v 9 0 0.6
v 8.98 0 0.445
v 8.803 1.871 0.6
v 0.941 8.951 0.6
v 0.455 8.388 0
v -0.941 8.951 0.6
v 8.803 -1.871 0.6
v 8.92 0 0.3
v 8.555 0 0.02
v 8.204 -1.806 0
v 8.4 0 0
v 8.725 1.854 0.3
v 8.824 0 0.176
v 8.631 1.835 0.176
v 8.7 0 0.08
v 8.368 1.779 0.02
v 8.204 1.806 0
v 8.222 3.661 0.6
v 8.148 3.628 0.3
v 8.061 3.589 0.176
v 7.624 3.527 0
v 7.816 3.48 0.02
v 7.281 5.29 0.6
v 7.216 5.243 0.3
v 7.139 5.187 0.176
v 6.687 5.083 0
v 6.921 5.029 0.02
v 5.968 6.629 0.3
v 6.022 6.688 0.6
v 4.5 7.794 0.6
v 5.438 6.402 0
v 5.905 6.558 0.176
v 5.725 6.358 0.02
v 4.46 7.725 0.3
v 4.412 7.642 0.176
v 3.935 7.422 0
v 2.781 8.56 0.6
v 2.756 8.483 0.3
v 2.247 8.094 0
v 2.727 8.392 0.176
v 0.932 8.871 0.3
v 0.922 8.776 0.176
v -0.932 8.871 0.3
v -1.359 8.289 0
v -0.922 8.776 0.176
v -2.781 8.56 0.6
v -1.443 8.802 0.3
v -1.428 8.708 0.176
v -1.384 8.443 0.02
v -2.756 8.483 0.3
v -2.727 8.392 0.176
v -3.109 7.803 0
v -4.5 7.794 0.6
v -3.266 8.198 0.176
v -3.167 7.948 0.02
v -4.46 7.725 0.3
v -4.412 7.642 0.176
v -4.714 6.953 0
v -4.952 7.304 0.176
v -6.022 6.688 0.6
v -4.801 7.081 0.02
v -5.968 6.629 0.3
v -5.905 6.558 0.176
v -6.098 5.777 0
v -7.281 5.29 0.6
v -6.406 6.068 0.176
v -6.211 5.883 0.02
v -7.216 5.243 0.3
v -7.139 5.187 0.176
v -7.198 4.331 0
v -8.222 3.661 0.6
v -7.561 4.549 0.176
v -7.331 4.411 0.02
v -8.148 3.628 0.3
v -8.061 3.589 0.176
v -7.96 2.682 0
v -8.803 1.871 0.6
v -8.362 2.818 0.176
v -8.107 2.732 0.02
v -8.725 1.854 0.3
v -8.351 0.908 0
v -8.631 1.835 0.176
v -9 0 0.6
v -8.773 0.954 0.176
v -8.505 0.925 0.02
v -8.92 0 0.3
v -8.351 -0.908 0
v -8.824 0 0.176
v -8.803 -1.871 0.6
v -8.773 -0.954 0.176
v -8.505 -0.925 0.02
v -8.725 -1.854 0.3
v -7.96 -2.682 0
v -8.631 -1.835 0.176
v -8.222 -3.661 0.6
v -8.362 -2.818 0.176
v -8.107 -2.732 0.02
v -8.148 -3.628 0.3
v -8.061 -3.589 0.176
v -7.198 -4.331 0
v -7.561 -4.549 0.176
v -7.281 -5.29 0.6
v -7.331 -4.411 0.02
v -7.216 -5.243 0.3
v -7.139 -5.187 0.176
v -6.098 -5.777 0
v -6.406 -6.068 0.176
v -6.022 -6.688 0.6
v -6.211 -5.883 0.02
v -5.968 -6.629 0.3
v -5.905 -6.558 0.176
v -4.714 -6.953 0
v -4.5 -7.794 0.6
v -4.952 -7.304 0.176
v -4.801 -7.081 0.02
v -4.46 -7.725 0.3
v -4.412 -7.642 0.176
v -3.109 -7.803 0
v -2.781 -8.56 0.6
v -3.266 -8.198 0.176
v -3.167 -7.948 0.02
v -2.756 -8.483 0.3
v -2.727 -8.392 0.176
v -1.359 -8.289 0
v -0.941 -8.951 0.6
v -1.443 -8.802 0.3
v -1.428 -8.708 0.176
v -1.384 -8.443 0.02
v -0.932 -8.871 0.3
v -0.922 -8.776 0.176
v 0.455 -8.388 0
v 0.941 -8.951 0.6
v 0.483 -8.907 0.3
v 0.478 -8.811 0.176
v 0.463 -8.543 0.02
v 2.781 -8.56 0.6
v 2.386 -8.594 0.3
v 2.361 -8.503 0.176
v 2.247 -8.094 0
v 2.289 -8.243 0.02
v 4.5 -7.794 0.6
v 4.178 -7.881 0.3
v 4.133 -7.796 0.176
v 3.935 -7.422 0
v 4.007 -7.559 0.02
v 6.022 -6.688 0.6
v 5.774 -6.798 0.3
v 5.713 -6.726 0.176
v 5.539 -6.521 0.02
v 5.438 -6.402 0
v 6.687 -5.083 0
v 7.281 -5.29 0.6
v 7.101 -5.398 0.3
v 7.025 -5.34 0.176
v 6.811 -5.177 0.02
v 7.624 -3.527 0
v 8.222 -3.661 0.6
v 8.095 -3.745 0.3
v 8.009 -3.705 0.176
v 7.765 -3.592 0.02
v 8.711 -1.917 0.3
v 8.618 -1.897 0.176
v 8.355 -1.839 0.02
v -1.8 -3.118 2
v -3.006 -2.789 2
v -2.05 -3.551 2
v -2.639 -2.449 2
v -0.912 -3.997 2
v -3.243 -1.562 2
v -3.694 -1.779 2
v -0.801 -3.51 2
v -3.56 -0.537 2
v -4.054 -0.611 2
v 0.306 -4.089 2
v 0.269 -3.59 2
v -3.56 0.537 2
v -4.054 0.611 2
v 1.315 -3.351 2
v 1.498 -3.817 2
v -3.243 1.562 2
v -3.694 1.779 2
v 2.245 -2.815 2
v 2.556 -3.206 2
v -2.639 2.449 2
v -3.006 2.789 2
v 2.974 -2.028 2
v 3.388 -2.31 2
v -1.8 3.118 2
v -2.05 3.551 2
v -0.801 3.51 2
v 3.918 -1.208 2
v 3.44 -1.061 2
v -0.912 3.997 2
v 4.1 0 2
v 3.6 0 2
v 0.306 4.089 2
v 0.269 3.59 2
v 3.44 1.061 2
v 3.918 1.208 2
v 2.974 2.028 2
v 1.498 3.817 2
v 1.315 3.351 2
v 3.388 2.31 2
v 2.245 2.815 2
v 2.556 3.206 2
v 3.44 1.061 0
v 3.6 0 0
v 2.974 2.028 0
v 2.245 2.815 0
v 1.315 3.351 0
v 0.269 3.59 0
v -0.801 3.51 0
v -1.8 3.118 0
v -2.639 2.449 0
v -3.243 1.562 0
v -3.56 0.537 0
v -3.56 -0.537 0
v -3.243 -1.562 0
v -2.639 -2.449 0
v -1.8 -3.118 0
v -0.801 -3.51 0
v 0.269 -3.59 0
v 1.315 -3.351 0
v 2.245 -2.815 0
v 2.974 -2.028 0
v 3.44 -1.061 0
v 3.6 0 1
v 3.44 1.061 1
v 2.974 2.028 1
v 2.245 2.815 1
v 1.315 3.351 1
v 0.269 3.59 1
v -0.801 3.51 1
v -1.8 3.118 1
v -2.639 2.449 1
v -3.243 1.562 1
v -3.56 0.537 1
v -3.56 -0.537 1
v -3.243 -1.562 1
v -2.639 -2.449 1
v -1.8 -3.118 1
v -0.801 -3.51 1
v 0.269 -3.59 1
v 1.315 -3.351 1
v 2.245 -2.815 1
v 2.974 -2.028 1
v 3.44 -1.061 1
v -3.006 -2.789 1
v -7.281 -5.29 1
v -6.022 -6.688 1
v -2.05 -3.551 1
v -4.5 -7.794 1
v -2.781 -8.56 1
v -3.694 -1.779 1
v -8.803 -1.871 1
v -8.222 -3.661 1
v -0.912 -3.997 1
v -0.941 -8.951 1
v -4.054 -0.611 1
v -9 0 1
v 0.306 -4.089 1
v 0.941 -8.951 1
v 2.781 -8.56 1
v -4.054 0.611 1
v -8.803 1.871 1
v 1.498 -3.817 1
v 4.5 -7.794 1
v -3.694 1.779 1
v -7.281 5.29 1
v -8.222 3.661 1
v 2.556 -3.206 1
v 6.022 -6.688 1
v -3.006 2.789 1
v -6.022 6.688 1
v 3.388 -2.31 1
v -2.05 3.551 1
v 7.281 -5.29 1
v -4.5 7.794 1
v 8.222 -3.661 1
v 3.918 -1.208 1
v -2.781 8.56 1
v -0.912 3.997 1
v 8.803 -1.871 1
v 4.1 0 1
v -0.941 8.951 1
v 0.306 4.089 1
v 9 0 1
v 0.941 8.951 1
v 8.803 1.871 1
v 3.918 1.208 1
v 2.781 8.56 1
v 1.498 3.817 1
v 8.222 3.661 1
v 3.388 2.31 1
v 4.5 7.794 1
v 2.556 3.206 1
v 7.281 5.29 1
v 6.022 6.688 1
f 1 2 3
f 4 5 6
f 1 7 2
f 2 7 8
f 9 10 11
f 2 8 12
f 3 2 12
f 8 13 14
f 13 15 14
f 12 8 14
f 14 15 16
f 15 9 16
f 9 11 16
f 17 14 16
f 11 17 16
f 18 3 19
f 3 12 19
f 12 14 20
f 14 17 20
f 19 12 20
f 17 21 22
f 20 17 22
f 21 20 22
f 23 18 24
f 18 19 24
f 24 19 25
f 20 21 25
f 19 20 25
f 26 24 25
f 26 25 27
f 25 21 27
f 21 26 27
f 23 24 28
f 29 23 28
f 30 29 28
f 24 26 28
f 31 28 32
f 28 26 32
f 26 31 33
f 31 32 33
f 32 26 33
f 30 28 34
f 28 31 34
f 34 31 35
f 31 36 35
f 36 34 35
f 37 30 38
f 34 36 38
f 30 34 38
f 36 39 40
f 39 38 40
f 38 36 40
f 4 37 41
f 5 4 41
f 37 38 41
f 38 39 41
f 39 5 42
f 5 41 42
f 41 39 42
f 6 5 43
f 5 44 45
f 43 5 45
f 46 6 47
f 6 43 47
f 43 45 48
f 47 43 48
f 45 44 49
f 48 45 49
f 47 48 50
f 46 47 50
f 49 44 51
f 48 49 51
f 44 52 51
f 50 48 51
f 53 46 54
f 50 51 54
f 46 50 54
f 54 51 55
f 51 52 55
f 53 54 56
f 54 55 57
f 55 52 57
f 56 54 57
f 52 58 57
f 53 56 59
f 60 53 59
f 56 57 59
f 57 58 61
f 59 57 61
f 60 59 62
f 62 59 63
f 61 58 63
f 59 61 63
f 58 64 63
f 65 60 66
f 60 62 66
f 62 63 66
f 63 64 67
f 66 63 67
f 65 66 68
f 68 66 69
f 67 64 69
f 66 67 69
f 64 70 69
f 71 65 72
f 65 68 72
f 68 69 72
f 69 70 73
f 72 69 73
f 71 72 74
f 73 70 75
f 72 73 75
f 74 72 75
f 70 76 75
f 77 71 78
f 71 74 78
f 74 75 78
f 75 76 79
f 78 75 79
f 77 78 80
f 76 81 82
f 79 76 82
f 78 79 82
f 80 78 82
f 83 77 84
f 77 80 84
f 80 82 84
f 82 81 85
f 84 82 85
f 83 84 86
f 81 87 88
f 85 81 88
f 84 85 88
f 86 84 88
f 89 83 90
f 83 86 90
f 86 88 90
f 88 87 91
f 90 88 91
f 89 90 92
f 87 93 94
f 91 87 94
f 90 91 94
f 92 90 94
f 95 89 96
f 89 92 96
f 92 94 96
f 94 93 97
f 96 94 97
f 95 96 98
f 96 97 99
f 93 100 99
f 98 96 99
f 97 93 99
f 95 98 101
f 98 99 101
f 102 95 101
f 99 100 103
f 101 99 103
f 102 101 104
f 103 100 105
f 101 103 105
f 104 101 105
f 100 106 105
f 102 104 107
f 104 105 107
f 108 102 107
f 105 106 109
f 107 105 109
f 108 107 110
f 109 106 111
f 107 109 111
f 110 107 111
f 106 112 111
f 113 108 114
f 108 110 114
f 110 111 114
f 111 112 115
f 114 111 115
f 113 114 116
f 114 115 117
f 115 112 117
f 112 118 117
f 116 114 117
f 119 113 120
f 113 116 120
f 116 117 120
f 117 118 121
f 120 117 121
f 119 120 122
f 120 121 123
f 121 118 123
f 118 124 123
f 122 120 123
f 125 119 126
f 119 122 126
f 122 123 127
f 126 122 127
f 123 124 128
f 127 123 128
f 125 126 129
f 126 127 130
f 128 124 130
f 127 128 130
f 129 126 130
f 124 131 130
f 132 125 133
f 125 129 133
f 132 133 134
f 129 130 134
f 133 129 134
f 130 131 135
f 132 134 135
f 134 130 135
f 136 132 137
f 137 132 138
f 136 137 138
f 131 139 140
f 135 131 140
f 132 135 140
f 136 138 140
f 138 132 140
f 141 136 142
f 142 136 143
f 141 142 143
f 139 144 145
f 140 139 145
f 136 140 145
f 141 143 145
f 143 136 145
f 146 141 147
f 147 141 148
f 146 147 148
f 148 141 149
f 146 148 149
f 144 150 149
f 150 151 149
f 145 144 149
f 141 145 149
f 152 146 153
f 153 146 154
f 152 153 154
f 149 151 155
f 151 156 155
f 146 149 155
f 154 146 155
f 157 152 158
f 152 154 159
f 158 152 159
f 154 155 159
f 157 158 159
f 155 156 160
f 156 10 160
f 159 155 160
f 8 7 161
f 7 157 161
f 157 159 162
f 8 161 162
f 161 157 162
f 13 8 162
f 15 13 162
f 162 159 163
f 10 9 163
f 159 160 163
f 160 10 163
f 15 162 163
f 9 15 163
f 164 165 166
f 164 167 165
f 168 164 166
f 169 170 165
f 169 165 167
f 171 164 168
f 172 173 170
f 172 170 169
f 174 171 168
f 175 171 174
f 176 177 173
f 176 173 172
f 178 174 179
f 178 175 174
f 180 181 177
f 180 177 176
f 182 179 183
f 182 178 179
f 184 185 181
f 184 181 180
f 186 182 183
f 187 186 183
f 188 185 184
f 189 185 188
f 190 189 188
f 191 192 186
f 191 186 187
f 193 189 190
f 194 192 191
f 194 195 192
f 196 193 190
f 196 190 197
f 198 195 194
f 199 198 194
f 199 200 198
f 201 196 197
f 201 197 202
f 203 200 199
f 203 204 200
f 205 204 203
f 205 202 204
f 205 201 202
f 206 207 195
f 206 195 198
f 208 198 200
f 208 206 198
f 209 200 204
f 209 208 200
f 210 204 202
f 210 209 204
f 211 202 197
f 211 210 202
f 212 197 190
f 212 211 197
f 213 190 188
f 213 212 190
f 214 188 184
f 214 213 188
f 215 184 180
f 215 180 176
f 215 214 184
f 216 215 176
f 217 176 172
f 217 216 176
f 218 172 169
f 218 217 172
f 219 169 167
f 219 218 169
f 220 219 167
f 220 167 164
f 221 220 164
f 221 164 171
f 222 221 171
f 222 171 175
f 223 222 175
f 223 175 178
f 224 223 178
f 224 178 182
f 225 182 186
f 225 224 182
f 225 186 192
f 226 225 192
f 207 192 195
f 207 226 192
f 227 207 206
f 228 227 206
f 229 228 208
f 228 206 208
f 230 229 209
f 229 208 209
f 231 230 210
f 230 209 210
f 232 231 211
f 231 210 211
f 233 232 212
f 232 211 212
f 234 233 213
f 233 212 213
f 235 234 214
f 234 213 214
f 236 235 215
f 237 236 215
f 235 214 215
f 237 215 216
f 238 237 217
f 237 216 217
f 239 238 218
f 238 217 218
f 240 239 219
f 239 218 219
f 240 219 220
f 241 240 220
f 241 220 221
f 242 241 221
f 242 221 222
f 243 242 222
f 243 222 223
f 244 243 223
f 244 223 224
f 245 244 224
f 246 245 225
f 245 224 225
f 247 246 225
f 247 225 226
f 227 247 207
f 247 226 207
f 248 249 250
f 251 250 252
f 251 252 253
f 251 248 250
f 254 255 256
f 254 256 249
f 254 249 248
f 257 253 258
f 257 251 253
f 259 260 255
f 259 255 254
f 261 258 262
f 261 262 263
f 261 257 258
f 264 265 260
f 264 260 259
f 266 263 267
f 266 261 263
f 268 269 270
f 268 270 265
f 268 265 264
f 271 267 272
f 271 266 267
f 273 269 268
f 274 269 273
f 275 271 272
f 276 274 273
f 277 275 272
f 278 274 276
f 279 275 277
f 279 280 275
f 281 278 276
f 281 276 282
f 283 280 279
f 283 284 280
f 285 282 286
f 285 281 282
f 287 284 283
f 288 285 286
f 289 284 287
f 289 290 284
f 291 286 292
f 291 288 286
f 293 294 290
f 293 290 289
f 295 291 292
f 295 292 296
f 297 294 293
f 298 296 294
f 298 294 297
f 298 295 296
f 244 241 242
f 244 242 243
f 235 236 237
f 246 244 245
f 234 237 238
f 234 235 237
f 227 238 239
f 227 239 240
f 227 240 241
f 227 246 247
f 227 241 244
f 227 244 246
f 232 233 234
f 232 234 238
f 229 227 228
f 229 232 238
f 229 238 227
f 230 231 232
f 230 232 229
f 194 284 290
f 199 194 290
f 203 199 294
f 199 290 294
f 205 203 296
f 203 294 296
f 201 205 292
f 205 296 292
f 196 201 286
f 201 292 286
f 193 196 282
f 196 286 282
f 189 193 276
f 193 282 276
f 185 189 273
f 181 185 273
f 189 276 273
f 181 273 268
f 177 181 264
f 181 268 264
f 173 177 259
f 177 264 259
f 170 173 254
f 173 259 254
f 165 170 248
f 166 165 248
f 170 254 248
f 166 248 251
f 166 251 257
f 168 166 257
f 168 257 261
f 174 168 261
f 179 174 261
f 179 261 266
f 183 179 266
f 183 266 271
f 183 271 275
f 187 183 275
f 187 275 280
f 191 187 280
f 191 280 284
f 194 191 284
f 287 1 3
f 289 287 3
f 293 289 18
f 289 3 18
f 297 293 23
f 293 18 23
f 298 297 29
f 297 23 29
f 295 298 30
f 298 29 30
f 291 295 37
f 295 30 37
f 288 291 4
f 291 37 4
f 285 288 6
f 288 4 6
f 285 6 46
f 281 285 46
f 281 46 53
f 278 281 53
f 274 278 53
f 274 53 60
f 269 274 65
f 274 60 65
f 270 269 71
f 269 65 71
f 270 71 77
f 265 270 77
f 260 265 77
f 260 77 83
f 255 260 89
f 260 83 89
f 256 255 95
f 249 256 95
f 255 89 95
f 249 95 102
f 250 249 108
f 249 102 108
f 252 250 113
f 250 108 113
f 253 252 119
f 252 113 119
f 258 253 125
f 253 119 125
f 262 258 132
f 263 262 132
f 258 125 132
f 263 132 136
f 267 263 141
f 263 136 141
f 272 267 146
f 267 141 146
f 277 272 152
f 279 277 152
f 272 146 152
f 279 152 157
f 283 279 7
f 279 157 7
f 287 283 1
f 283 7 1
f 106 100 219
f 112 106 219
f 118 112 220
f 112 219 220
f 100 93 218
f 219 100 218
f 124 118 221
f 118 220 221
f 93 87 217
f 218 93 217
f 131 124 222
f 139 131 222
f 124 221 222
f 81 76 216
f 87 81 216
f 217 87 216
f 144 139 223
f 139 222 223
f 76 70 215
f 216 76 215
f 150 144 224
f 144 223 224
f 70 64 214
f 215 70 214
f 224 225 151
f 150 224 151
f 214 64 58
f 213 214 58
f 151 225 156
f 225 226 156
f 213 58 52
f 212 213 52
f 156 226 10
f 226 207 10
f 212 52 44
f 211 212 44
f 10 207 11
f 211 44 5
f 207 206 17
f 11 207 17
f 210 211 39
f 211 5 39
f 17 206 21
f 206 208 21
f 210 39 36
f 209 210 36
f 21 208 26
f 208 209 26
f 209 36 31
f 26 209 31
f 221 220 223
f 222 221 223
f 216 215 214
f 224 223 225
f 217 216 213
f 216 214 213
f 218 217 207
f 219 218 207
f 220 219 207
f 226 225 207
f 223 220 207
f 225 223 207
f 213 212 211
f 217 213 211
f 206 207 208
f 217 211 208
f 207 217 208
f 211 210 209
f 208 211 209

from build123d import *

# Parameters (mm, degrees)
F0_R     = 9
F0_R_2   = 4.1
F1_DEPTH = 1
F0_R_3   = 3.6
F2_DEPTH = 2
F3_R     = 0.6


with BuildPart() as f1:
    # F0 (on Top) → F1 (new body)
    with BuildSketch(Plane.XY):
        Circle(F0_R)
        Circle(F0_R_2, mode=Mode.SUBTRACT)
    extrude(amount=F1_DEPTH)

    # F0 (on Top) → F2 (join)
    with BuildSketch(Plane.XY):
        Circle(F0_R_2)
        Circle(F0_R_3, mode=Mode.SUBTRACT)
    extrude(amount=F2_DEPTH)

    # F3
    f3_edges = [f1.edges().sort_by_distance(p)[0] for p in [
        (-9, 0, 0),
    ]]
    fillet(f3_edges, radius=F3_R)


with BuildPart() as f1b:
    # F0 (on Top) → F1, piece 2 (new body)
    with BuildSketch(Plane.XY):
        Circle(F0_R_3)
    extrude(amount=F1_DEPTH)


solid = Compound([f1.part, f1b.part])
